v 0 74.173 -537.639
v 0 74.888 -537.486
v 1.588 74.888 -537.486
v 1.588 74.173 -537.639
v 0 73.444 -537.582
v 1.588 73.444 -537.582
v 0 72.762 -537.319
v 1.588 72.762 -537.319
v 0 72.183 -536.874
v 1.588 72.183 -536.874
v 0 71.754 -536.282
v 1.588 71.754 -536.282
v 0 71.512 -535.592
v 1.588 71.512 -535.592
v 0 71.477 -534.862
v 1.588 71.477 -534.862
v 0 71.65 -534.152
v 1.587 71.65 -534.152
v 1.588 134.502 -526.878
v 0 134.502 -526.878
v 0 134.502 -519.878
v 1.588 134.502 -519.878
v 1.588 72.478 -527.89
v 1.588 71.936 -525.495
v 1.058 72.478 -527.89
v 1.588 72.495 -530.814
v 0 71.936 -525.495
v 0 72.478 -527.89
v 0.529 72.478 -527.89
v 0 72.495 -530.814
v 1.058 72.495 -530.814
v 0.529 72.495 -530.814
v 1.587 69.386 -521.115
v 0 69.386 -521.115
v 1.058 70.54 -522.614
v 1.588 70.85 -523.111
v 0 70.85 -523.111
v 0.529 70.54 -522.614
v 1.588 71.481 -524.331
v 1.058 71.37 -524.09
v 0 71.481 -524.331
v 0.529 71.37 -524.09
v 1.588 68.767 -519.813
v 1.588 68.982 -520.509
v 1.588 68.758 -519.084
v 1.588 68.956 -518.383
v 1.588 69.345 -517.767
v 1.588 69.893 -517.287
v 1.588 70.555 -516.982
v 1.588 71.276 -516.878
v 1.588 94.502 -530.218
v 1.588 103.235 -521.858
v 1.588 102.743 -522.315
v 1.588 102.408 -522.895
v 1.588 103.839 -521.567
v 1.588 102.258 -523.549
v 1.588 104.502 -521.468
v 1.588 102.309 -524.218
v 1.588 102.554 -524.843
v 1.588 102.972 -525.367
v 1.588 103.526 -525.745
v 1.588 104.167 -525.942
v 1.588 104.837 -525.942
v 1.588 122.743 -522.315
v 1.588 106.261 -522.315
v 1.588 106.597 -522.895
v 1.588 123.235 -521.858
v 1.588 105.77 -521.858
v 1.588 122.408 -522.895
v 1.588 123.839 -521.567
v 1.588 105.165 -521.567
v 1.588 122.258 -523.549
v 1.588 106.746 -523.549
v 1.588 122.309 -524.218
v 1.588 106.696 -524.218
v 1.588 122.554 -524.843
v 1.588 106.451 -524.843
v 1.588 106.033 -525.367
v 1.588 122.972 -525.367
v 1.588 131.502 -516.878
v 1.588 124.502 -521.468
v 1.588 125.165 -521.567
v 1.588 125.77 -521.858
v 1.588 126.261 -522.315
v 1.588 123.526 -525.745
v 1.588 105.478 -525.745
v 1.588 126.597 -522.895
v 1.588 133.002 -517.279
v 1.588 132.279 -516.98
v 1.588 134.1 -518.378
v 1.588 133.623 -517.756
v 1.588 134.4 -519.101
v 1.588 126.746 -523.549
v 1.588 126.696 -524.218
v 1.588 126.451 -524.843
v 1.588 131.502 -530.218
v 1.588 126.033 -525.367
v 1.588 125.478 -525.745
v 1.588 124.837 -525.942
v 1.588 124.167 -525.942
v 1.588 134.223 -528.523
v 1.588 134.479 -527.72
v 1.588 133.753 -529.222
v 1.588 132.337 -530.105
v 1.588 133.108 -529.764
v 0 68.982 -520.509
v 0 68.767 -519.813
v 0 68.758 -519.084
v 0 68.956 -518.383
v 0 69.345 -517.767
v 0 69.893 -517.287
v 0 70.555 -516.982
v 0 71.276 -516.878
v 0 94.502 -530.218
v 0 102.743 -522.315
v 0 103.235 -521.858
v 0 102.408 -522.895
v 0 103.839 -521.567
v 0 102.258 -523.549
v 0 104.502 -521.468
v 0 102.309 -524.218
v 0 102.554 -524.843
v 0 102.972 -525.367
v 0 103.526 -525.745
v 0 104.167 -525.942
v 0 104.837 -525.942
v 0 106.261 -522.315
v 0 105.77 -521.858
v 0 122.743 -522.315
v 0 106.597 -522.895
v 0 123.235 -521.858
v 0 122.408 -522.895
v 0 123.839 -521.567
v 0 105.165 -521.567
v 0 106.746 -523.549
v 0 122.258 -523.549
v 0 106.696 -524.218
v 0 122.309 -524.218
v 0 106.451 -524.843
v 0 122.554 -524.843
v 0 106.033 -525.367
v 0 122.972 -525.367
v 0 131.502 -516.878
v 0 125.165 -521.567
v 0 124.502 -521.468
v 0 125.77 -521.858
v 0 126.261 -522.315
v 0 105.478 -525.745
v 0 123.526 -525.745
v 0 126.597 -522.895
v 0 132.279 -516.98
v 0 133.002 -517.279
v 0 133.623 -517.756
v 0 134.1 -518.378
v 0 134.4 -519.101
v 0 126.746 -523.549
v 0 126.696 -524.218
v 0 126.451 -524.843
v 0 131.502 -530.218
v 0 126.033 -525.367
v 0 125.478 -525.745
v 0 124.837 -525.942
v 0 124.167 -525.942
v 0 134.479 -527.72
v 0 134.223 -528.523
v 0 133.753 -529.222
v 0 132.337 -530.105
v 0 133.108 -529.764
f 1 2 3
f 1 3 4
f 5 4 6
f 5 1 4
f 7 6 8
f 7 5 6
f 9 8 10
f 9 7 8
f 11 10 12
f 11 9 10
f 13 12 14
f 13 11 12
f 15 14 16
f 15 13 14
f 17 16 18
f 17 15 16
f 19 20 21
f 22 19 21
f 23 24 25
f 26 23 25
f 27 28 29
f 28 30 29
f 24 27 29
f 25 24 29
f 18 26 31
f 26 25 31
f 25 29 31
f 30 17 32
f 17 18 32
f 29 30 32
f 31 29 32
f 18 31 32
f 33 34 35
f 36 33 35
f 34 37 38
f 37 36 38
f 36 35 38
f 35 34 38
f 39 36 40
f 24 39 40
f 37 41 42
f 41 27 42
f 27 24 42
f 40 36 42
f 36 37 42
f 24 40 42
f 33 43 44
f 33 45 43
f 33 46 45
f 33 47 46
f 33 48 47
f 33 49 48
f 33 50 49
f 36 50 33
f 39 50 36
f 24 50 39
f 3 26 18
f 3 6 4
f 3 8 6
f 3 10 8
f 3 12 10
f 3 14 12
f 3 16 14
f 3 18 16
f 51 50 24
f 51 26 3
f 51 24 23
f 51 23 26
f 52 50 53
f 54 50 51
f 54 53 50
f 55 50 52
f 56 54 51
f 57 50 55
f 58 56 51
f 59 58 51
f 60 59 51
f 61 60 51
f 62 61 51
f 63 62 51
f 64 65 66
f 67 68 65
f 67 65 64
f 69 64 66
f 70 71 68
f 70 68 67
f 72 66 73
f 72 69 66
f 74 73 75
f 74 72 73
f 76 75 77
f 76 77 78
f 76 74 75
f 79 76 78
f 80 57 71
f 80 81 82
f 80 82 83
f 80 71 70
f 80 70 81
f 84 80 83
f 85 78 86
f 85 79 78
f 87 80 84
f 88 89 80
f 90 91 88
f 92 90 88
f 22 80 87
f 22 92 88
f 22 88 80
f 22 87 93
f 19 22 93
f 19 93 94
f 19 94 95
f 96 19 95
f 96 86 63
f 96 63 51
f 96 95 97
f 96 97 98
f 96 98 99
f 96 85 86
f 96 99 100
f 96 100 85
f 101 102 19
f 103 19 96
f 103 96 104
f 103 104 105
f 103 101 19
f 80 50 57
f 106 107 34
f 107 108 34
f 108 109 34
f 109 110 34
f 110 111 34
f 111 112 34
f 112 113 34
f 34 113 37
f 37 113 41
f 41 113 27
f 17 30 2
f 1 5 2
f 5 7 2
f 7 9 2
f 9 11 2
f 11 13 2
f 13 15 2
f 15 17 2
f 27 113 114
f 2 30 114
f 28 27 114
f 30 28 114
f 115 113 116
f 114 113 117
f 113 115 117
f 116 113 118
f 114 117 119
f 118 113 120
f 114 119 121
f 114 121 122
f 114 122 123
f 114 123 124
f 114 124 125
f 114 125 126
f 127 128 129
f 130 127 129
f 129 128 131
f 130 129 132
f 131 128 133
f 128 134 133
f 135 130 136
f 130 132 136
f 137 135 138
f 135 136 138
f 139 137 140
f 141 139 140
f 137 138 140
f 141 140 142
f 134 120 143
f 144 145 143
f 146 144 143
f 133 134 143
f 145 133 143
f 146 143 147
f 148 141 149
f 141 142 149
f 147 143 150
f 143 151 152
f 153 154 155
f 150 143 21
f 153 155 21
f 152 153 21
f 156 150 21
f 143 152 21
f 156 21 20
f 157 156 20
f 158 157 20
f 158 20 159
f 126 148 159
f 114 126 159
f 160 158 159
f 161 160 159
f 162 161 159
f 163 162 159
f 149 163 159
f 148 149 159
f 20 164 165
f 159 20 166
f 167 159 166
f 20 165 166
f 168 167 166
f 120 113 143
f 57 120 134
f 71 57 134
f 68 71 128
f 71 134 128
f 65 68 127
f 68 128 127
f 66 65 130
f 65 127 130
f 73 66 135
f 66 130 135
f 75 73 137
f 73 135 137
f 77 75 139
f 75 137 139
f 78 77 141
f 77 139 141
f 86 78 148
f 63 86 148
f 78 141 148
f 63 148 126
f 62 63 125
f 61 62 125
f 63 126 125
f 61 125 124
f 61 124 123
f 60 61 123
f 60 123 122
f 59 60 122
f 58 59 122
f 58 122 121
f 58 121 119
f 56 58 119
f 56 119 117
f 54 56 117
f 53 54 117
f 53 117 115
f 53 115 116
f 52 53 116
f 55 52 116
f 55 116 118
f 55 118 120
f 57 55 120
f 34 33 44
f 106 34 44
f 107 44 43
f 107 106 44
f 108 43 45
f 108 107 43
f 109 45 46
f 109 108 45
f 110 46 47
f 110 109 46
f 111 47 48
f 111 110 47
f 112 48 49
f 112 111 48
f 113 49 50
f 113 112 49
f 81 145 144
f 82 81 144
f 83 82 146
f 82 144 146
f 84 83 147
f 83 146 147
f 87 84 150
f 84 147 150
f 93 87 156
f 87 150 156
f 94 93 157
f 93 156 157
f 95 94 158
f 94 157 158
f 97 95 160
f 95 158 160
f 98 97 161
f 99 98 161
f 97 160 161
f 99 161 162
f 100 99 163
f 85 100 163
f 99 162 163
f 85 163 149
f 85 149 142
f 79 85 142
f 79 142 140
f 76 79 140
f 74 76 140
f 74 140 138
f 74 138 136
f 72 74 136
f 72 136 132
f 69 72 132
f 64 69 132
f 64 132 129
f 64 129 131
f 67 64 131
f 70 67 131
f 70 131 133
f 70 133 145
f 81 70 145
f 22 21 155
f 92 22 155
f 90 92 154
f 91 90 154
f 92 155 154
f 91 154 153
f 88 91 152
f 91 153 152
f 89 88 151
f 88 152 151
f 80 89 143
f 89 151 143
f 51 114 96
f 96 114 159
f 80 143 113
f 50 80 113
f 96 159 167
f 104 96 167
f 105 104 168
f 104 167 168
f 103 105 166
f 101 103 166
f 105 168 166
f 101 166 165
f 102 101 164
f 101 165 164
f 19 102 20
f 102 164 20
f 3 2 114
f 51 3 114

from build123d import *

# Parameters (mm, degrees)
SKETCH1_R            = 3.025
BOSS_EXTRUDE1_DEPTH  = 1.5875
FILLET1_START        = -1
FILLET1_DEPTH        = 4
M4_CLEARANCE_HOLE1_D = 4.5


with BuildPart() as part:
    # Sketch1 → Boss-Extrude1 (new body)
    # profile 1 of 4: a face of its own
    with BuildSketch(Plane(origin=(0, 0, 0), x_dir=(0, 0, -1), z_dir=(1, 0, 0))):
        with BuildLine():
            Line((541.51052412, 64.02688415), (530.217508306, 94.502121028))
            Line((530.217508306, 94.502121028), (516.877503621, 94.502121028))
            Line((516.877503621, 94.502121028), (516.877503621, 59.781603486))
            add(Edge.make_bspline(
                [(516.877503621, 59.781603486), (516.877503621, 66.224434359), (520.85597879, 70.389492112), (525.494944029, 71.935813858)],
                knots=[0.791503971, 0.791503971, 0.791503971, 0.791503971, 1, 1, 1, 1], degree=3, weights=[0.513780637, 0.559932173, 0.722005294, 1]))
            add(Edge.make_bspline(
                [(525.494944029, 71.935813858), (531.367057327, 73.893184958), (538.581630796, 71.930770882), (541.51052412, 64.02688415)],
                knots=[0, 0, 0, 0, 0.245758306, 0.245758306, 0.245758306, 0.245758306], degree=3, weights=[1, 0.672322259, 0.505703571, 0.500143936]))
        make_face()
    # profile 2 of 4: a face of its own
    with BuildSketch(Plane(origin=(0, 0, 0), x_dir=(0, 0, -1), z_dir=(1, 0, 0))):
        with BuildLine():
            Line((516.877503621, 131.502121028), (516.877503621, 94.502121028))
            Line((516.877503621, 94.502121028), (530.217508306, 94.502121028))
            Line((530.217508306, 94.502121028), (530.217508306, 131.502121028))
            ThreePointArc((530.217508306, 131.502121028), (529.222247158, 133.753333946), (526.877503621, 134.502121028))
            Line((526.877503621, 134.502121028), (519.877503621, 134.502121028))
            ThreePointArc((519.877503621, 134.502121028), (517.756183277, 133.623441372), (516.877503621, 131.502121028))
        make_face()
        with Locations((523.717508306, 104.502121028)):
            Circle(SKETCH1_R, mode=Mode.SUBTRACT)
        with Locations((523.717508306, 124.502121028)):
            Circle(SKETCH1_R, mode=Mode.SUBTRACT)
    # profile 3 of 4: a face of its own
    with BuildSketch(Plane(origin=(0, 0, 0), x_dir=(0, 0, -1), z_dir=(1, 0, 0))):
        with Locations((523.717508306, 104.502121028)):
            Circle(SKETCH1_R)
    # profile 4 of 4: a face of its own
    with BuildSketch(Plane(origin=(0, 0, 0), x_dir=(0, 0, -1), z_dir=(1, 0, 0))):
        with Locations((523.717508306, 124.502121028)):
            Circle(SKETCH1_R)
    extrude(amount=BOSS_EXTRUDE1_DEPTH)

    # Fillet1: read off the stored shape, not the designer's step
    # Fillet1 outline → Fillet1 (cut)
    with BuildSketch(Plane.YZ.offset(FILLET1_START)):
        with BuildLine():
            add(Edge.make_bspline(
                [(59.781603486, -516.877503621), (63.745099458, -516.877503621), (67.076255883, -518.543444616), (69.385969927, -521.114832125)],
                knots=[0.791503971, 0.791503971, 0.791503971, 0.791503971, 0.915480845, 0.915480845, 0.915480845, 0.915480845], degree=3, weights=[0.513780637, 0.541223477, 0.609653692, 0.719071281]))
            ThreePointArc((69.385969927, -521.114832125), (68.955807133, -518.383002389), (71.275593157, -516.877503621))
            Line((71.275593157, -516.877503621), (59.781603486, -516.877503621))
        make_face()
        with BuildLine():
            ThreePointArc((74.887594645, -537.485939312), (72.182937452, -536.873853395), (71.650054639, -534.152483223))
            add(Edge.make_bspline(
                [(71.650054639, -534.152483223), (70.307636138, -537.474178056), (67.681794337, -540.156147165), (64.02688415, -541.51052412)],
                knots=[1.132789983, 1.132789983, 1.132789983, 1.132789983, 1.245758306, 1.245758306, 1.245758306, 1.245758306], degree=3, weights=[0.609905504, 0.539286736, 0.502699547, 0.500143936]))
            Line((64.02688415, -541.51052412), (74.887594645, -537.485939312))
        make_face()
    extrude(amount=FILLET1_DEPTH, mode=Mode.SUBTRACT)

    # M4 Clearance Hole1 (through all)
    with Locations(Plane(origin=(1.5875, 0, 0), x_dir=(0, 0, -1), z_dir=(1, 0, 0))):
        with Locations((523.717508306, 124.502121028), (523.717508306, 104.502121028)):
            Hole(M4_CLEARANCE_HOLE1_D / 2)


solid = part.part
